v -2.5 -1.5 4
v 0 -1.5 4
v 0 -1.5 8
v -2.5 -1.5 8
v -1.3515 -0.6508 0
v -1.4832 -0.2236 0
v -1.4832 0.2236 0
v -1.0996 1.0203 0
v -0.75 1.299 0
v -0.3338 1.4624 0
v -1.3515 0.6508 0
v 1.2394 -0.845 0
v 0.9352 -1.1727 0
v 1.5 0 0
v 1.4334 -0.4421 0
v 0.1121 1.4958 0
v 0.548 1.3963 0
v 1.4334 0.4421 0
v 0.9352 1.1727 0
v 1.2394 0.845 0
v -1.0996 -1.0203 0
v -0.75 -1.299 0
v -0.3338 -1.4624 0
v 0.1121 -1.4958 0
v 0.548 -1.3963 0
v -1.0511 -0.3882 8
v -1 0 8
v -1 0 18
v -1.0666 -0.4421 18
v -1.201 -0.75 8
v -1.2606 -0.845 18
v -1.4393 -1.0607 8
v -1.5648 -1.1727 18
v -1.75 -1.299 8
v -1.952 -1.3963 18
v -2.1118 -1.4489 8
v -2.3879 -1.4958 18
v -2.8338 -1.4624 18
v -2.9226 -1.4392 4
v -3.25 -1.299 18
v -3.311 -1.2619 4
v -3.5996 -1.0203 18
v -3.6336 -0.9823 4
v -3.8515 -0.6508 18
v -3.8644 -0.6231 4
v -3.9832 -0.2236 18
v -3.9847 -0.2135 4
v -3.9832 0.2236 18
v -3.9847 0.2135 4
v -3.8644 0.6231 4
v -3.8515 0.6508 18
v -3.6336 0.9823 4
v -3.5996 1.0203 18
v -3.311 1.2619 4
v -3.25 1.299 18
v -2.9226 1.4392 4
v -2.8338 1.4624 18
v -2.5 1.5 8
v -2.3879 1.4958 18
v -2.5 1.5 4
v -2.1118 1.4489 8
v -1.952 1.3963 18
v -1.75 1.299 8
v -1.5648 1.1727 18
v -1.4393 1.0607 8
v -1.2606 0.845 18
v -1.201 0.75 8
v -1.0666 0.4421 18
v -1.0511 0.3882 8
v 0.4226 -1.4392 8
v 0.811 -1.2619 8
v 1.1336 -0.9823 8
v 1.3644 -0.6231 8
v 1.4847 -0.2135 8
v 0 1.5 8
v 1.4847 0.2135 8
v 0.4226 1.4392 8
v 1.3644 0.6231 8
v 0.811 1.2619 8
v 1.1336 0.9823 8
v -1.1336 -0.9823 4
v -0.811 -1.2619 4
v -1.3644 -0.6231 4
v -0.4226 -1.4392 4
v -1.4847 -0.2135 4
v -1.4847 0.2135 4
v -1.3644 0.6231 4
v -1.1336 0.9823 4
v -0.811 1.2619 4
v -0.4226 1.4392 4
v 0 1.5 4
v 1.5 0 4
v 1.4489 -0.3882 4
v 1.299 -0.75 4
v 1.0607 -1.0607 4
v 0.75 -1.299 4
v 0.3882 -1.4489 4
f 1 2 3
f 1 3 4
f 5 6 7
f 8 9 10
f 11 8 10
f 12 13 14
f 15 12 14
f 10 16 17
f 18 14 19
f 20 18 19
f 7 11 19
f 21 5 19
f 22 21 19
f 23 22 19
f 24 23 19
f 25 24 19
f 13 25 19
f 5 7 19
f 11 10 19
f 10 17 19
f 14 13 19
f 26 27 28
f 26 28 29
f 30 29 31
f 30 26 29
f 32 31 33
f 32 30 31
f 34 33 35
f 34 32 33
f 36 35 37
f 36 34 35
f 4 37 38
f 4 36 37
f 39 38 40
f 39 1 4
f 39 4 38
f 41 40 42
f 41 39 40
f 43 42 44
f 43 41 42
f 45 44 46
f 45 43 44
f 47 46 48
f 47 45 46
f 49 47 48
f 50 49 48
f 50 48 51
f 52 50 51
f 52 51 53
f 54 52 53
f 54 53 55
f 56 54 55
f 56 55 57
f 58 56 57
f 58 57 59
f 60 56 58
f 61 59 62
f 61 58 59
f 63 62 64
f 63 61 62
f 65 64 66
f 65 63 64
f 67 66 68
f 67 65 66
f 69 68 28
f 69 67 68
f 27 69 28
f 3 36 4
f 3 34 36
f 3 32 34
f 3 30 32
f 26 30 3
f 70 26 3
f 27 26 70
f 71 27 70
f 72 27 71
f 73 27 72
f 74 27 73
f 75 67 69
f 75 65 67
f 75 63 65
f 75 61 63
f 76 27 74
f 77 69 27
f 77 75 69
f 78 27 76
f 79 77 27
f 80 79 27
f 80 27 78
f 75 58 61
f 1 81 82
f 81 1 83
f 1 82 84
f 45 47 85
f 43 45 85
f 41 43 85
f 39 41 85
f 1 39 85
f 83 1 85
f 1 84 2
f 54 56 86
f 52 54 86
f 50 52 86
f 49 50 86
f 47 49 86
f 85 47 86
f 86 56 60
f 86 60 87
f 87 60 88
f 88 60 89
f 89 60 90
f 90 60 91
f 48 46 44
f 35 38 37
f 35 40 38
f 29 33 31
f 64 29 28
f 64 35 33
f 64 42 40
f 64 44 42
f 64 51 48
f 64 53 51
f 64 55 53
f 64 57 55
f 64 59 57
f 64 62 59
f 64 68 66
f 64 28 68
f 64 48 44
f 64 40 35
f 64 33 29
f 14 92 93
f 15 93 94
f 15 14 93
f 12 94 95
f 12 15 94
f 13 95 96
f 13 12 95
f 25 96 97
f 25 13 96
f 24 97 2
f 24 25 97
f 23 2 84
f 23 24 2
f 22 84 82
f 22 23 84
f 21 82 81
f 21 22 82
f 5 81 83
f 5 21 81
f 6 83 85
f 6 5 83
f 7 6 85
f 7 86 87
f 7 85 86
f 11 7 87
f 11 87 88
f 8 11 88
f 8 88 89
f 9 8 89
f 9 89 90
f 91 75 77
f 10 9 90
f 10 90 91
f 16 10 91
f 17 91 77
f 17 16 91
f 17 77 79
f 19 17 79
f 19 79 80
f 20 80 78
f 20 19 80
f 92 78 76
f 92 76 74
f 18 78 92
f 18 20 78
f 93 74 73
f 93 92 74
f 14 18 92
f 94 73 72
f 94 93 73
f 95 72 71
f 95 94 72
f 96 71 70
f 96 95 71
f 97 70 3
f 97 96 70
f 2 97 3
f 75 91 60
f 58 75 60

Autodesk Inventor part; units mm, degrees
ref_plane "YZ Plane" through (0, 0, 0) normal (1, 0, 0) x (0, 1, 0)
ref_plane "XZ Plane" through (0, 0, 0) normal (0, 1, 0) x (-1, 0, 0)
ref_plane "XY Plane" through (0, 0, 0) normal (0, 0, 1) x (1, 0, 0)
sketch "草图1" plane through (0, 0, 0) normal (0, 0, 1) x (1, 0, 0)
  circle A0 centre (0, 0) radius 1.5
  dimension "d0" = 3
extrude "拉伸1" add sketch "草图1" along normal blind 4
sketch "草图2" plane through (0, 0, 4) normal (0, 0, 1) x (1, 0, 0)
  arc A0 (0, -1.5) -> (0, 1.5) centre (0, 0) ccw
  circle A1 centre (0, 0) radius 1.5 projected
  line L0 (0, -1.5) -> (-2.5, -1.5)
  line L1 (0, 1.5) -> (-2.5, 1.5)
  line L2 (-2.5, 1.5) -> (-2.5, -1.5)
  arc A2 (-2.5, 1.5) -> (-2.5, -1.5) centre (-2.5, 0) ccw
  dimension "d3" = 2.5
extrude "拉伸2" add sketch "草图2" along normal blind 4
sketch "草图3" plane through (0, 0, 8) normal (0, 0, 1) x (1, 0, 0)
  arc A0 (-2.5, 1.5) -> (-2.5, -1.5) centre (-2.5, 0) ccw projected
  circle A1 centre (-2.5, 0) radius 1.5
  point P0 (0, 0)
extrude "拉伸3" add sketch "草图3" along normal blind 10
properties part number "偏心支轴"
